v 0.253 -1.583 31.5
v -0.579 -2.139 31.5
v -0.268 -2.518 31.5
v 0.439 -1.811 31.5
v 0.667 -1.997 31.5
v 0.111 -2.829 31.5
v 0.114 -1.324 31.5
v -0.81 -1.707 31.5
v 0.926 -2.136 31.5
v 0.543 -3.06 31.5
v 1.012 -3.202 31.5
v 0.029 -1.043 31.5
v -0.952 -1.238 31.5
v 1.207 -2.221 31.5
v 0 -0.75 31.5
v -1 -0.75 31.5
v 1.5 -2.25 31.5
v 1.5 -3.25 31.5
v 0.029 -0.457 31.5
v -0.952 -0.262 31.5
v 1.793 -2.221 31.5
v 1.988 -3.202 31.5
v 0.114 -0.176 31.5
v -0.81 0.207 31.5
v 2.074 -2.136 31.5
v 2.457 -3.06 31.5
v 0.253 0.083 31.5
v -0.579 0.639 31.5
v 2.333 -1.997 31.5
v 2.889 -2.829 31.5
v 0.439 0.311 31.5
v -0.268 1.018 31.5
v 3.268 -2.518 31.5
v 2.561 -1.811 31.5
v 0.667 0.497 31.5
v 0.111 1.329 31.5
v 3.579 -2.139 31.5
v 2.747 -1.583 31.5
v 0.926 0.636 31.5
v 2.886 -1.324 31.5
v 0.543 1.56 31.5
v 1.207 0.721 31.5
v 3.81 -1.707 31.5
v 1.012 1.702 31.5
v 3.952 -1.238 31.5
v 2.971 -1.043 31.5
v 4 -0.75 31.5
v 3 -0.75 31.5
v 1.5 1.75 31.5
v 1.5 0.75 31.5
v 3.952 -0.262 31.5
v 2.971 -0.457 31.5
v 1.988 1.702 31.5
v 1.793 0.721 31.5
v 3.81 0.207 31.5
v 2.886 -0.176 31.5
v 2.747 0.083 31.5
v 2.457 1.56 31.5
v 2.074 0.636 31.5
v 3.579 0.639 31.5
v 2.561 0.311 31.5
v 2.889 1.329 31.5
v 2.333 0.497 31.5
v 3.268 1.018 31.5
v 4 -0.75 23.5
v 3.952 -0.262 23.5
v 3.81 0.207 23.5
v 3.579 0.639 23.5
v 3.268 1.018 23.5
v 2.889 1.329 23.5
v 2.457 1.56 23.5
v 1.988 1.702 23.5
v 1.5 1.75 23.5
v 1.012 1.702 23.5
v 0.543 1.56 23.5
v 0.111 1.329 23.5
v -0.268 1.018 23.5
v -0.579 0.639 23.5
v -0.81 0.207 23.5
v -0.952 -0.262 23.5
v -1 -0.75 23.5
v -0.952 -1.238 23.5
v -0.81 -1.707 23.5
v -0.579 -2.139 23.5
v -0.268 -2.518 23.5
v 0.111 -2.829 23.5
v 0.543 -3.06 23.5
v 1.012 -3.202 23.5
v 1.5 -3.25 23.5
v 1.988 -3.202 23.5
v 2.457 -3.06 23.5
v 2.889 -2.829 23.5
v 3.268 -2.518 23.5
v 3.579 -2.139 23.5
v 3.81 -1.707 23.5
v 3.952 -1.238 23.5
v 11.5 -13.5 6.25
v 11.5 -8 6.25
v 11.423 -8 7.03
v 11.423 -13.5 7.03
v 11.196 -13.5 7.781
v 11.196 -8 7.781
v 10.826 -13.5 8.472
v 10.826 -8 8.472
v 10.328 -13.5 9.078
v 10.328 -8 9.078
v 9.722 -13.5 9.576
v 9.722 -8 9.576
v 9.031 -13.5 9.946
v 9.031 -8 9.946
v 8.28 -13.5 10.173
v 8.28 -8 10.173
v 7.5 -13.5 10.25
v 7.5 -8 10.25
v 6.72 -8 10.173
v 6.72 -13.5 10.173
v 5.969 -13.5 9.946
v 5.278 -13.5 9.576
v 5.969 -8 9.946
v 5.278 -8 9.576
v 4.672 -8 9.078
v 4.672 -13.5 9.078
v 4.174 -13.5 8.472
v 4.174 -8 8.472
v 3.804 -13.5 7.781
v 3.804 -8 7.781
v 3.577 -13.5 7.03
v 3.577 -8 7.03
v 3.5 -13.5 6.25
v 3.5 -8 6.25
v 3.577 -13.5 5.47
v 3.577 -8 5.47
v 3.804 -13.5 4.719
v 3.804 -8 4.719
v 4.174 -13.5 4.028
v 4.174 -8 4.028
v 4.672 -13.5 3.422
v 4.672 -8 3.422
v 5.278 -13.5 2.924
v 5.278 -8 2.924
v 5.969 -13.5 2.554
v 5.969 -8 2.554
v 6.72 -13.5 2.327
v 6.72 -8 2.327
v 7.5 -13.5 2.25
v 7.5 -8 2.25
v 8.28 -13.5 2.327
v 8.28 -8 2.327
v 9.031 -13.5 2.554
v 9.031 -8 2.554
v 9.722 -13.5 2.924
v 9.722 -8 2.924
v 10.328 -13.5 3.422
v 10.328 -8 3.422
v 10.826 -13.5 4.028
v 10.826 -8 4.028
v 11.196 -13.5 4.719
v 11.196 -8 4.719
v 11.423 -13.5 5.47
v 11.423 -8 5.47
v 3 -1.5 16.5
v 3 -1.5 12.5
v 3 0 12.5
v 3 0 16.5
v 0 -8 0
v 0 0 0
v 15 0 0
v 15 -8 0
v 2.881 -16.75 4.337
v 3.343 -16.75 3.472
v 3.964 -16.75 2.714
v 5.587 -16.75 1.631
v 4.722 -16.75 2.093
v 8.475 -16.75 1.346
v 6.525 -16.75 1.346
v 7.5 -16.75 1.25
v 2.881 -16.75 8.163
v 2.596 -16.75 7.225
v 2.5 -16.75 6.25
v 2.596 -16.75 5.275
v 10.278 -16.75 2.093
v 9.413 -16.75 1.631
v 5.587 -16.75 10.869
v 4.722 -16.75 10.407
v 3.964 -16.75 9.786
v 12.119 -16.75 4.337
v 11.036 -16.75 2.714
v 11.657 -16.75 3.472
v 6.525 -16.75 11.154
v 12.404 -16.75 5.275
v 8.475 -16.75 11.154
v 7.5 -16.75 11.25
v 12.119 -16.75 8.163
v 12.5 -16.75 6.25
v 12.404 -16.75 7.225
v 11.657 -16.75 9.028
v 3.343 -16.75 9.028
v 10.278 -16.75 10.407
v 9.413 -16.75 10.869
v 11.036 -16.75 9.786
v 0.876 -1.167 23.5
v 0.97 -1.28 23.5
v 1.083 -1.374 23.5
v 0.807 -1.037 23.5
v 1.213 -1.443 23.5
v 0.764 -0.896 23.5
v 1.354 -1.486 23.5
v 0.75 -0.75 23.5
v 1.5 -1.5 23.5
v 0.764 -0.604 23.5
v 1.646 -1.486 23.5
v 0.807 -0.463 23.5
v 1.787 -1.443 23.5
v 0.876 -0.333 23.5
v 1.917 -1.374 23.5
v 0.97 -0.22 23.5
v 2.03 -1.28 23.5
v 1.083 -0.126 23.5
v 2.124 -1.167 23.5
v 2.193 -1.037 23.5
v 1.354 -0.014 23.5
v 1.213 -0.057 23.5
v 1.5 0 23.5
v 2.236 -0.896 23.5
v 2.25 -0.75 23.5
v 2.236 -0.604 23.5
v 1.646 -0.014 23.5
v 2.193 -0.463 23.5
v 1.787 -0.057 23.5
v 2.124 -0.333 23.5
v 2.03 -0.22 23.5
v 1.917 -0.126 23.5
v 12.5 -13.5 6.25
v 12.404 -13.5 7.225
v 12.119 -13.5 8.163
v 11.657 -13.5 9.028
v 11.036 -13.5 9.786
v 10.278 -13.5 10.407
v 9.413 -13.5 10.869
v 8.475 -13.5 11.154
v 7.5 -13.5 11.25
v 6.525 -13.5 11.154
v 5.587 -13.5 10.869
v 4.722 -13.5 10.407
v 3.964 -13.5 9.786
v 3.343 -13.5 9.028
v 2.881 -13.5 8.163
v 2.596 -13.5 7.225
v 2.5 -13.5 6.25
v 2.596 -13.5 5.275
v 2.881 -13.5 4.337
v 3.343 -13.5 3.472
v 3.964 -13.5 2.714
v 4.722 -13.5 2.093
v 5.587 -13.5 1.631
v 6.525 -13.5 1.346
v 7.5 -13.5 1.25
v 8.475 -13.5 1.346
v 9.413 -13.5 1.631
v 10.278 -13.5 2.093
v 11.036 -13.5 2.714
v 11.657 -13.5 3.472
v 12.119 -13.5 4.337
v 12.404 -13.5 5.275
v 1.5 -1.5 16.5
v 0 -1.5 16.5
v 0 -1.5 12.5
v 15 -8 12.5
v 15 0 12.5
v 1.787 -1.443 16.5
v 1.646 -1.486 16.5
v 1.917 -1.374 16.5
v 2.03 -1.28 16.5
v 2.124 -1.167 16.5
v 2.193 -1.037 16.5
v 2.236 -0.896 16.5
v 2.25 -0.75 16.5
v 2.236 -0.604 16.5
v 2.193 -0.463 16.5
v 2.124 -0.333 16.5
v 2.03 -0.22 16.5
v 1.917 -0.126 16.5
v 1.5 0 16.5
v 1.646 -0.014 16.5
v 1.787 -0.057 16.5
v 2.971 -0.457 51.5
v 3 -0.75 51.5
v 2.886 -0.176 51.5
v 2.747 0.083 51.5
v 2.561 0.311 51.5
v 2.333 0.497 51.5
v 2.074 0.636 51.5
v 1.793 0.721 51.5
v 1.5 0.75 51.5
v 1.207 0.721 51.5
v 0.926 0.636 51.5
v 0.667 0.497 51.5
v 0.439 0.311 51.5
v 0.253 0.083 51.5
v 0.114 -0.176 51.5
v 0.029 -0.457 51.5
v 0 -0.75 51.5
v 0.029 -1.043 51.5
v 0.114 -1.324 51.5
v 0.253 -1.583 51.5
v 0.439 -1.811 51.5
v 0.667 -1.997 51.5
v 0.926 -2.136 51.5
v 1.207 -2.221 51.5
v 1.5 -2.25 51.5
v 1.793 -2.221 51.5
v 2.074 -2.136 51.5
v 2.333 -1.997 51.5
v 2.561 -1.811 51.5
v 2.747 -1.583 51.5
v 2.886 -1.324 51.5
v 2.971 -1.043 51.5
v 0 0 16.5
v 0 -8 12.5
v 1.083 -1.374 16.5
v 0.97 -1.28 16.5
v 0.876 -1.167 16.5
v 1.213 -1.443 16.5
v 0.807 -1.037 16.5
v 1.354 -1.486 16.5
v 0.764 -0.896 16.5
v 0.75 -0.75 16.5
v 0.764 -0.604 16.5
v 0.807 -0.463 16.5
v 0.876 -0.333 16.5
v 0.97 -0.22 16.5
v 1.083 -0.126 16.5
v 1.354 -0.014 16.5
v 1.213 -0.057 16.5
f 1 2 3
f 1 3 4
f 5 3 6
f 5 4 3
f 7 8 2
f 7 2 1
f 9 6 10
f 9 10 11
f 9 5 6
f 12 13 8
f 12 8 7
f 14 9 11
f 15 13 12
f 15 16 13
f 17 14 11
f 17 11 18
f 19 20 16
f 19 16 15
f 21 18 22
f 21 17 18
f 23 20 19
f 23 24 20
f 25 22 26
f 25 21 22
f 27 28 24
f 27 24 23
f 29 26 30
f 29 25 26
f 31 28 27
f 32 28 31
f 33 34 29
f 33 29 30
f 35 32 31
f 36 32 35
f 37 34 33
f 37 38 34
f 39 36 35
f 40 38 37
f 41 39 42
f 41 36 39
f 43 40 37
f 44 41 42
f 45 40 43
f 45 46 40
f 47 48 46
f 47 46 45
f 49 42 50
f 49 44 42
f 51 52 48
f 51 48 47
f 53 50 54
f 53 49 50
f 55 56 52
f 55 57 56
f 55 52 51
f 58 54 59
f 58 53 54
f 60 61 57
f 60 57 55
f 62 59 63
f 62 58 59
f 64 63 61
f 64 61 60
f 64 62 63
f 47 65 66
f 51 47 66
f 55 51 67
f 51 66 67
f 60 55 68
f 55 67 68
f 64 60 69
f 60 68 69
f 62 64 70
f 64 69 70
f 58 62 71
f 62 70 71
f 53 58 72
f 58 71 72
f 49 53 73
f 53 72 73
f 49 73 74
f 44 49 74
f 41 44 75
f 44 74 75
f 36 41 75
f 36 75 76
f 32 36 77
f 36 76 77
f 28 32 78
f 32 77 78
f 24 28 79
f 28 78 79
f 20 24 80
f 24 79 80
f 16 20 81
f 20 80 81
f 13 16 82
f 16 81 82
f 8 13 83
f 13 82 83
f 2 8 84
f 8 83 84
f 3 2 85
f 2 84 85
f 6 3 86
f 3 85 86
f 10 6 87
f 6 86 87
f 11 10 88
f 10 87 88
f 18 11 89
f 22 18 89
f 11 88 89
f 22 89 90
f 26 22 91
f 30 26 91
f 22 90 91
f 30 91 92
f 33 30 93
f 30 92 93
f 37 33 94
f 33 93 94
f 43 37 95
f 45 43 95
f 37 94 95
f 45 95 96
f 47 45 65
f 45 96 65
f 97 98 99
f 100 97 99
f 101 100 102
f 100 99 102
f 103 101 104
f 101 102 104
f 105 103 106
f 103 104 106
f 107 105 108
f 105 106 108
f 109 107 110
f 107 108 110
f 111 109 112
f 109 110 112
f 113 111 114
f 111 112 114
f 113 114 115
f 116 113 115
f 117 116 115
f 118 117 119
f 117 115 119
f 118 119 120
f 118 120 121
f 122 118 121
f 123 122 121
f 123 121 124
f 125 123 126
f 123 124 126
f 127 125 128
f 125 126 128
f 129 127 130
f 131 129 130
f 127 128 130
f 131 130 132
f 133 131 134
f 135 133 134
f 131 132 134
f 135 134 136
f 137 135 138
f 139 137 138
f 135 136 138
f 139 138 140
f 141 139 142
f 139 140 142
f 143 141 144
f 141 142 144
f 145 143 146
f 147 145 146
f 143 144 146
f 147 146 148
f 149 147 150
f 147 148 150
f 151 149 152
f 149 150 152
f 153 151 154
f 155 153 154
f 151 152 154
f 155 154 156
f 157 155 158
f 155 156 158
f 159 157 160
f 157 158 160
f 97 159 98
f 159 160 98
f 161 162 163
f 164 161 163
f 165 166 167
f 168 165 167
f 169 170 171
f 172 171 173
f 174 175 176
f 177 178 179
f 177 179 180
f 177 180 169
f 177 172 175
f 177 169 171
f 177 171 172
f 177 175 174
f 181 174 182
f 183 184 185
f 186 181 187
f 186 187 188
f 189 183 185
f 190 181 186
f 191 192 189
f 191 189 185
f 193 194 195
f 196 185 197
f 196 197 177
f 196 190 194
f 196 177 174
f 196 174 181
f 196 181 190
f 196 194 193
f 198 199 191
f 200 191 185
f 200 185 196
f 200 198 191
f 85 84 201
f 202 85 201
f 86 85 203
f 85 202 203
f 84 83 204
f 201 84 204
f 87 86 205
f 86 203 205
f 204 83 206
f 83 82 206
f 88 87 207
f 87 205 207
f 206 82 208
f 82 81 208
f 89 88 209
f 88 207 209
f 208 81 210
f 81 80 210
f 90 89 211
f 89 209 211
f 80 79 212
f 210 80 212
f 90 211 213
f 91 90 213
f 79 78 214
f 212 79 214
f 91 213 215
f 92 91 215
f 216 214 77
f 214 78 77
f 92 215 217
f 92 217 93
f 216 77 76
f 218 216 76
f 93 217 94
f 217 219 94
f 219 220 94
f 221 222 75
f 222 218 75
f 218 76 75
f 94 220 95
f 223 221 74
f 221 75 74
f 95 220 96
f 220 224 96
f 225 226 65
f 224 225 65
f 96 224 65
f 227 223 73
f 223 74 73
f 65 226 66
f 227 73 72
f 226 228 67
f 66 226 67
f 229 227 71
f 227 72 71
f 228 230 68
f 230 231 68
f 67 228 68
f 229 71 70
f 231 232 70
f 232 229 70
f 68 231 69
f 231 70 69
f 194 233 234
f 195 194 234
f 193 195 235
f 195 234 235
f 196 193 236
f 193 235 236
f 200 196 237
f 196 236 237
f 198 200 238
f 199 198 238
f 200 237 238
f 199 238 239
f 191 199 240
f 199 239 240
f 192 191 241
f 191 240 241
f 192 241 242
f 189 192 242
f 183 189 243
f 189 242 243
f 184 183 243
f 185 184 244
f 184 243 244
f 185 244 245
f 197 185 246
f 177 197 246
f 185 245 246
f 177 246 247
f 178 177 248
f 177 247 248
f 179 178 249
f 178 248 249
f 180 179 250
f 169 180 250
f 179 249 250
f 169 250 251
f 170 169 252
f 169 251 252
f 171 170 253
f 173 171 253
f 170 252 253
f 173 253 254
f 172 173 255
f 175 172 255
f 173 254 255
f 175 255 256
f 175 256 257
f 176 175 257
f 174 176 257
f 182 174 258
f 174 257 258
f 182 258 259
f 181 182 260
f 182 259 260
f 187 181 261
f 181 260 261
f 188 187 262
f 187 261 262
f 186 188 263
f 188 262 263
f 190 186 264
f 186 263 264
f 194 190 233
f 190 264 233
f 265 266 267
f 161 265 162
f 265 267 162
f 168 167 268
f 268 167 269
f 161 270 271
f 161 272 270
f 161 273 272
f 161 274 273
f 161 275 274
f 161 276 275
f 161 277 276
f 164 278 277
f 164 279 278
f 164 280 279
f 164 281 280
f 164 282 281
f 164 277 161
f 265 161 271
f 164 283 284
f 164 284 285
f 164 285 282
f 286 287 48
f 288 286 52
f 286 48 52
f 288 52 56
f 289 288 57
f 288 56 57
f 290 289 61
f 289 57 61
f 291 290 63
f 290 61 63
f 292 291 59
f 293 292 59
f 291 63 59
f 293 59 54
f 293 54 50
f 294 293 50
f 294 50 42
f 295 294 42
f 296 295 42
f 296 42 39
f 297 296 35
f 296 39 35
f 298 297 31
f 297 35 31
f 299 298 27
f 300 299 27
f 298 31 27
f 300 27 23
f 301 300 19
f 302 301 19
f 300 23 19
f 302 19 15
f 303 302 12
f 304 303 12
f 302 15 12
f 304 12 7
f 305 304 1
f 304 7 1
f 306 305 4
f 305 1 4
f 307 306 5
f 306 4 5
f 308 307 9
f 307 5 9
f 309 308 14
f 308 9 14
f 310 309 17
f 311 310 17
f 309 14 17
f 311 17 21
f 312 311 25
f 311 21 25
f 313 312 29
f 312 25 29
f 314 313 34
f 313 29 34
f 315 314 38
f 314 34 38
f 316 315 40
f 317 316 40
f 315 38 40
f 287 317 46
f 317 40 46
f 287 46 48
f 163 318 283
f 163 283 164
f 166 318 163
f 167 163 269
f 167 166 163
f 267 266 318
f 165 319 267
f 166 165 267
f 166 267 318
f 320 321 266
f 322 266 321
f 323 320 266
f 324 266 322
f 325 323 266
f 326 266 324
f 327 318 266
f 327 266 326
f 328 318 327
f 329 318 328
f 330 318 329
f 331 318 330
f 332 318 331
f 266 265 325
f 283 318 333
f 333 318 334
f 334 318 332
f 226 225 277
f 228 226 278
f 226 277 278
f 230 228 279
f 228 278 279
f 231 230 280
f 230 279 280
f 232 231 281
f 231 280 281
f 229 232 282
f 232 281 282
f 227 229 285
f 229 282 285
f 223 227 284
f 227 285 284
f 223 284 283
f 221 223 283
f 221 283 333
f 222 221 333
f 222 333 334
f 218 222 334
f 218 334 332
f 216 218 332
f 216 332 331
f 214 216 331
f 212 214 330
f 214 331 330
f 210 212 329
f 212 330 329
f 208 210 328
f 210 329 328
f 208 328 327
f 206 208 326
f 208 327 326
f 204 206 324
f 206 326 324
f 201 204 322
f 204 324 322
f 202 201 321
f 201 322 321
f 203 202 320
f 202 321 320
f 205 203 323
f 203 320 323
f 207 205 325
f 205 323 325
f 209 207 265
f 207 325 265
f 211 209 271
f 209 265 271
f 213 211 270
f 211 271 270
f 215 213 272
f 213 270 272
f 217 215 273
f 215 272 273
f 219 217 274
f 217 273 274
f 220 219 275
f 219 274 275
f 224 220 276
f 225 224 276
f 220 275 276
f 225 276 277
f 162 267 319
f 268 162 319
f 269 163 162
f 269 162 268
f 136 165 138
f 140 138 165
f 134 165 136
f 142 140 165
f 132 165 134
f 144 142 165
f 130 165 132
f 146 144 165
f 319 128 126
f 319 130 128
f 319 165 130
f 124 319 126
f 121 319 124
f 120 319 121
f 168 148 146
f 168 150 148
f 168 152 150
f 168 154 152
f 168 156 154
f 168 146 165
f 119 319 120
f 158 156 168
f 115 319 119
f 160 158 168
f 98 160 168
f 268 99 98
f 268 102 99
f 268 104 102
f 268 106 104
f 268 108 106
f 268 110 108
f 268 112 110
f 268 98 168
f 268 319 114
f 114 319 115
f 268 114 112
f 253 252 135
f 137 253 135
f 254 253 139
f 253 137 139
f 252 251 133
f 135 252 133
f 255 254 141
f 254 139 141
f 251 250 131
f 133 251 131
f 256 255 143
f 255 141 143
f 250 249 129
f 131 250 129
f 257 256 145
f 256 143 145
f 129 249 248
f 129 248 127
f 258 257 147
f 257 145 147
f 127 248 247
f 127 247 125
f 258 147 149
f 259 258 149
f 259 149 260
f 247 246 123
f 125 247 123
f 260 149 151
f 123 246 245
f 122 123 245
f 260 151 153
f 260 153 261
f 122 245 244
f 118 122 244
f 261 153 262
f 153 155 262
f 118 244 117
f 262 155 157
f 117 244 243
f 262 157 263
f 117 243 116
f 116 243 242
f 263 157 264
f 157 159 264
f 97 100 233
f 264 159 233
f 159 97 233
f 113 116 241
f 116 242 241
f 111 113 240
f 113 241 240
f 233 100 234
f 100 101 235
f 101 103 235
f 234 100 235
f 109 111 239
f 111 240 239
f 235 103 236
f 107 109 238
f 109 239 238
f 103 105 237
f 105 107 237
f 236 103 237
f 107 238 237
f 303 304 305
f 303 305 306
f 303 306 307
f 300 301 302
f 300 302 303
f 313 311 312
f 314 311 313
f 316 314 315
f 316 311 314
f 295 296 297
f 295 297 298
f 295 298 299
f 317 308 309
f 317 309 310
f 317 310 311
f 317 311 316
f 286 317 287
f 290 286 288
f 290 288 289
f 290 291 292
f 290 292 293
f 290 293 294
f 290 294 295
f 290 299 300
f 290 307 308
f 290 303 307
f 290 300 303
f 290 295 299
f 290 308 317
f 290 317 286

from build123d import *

# Parameters (mm, degrees)
F0_W      = 15
F0_H      = 12.5
F1_DEPTH  = 8
F2_R      = 4
F3_DEPTH  = 5.5
F4_R      = 5
F5_DEPTH  = 3.25
F6_W      = 3
F6_H      = 1.5
F7_DEPTH  = 4
F8_R      = 0.75
F9_DEPTH  = 7
F10_R     = 2.5
F11_DEPTH = 8
F12_R     = 1.5
F13_DEPTH = 20


with BuildPart() as f1:
    # F0 (on Front) → F1 (new body)
    with BuildSketch(Plane.XZ):
        with Locations((7.5, 6.25)):
            Rectangle(F0_W, F0_H)
    extrude(amount=F1_DEPTH)

    # F2 (on face) → F3 (join)
    with BuildSketch(Plane.XZ.offset(8)):
        with Locations((7.5, 6.25)):
            Circle(F2_R)
    extrude(amount=F3_DEPTH)

    # F4 (on face) → F5 (join)
    with BuildSketch(Plane.XZ.offset(13.5)):
        with Locations((7.5, 6.25)):
            Circle(F4_R)
    extrude(amount=F5_DEPTH)

    # F6 (on face) → F7 (join)
    with BuildSketch(Plane.XY.offset(12.5)):
        with Locations((1.5, -0.75)):
            Rectangle(F6_W, F6_H)
    extrude(amount=F7_DEPTH)

    # F8 (on face) → F9 (join)
    with BuildSketch(Plane.XY.offset(16.5)):
        with Locations((1.5, -0.75)):
            Circle(F8_R)
    extrude(amount=F9_DEPTH)

    # F10 (on face) → F11 (join)
    with BuildSketch(Plane.XY.offset(23.5)):
        with Locations((1.5, -0.75)):
            Circle(F10_R)
    extrude(amount=F11_DEPTH)

    # F12 (on face) → F13 (join)
    with BuildSketch(Plane.XY.offset(31.5)):
        with Locations((1.5, -0.75)):
            Circle(F12_R)
    extrude(amount=F13_DEPTH)


solid = f1.part
